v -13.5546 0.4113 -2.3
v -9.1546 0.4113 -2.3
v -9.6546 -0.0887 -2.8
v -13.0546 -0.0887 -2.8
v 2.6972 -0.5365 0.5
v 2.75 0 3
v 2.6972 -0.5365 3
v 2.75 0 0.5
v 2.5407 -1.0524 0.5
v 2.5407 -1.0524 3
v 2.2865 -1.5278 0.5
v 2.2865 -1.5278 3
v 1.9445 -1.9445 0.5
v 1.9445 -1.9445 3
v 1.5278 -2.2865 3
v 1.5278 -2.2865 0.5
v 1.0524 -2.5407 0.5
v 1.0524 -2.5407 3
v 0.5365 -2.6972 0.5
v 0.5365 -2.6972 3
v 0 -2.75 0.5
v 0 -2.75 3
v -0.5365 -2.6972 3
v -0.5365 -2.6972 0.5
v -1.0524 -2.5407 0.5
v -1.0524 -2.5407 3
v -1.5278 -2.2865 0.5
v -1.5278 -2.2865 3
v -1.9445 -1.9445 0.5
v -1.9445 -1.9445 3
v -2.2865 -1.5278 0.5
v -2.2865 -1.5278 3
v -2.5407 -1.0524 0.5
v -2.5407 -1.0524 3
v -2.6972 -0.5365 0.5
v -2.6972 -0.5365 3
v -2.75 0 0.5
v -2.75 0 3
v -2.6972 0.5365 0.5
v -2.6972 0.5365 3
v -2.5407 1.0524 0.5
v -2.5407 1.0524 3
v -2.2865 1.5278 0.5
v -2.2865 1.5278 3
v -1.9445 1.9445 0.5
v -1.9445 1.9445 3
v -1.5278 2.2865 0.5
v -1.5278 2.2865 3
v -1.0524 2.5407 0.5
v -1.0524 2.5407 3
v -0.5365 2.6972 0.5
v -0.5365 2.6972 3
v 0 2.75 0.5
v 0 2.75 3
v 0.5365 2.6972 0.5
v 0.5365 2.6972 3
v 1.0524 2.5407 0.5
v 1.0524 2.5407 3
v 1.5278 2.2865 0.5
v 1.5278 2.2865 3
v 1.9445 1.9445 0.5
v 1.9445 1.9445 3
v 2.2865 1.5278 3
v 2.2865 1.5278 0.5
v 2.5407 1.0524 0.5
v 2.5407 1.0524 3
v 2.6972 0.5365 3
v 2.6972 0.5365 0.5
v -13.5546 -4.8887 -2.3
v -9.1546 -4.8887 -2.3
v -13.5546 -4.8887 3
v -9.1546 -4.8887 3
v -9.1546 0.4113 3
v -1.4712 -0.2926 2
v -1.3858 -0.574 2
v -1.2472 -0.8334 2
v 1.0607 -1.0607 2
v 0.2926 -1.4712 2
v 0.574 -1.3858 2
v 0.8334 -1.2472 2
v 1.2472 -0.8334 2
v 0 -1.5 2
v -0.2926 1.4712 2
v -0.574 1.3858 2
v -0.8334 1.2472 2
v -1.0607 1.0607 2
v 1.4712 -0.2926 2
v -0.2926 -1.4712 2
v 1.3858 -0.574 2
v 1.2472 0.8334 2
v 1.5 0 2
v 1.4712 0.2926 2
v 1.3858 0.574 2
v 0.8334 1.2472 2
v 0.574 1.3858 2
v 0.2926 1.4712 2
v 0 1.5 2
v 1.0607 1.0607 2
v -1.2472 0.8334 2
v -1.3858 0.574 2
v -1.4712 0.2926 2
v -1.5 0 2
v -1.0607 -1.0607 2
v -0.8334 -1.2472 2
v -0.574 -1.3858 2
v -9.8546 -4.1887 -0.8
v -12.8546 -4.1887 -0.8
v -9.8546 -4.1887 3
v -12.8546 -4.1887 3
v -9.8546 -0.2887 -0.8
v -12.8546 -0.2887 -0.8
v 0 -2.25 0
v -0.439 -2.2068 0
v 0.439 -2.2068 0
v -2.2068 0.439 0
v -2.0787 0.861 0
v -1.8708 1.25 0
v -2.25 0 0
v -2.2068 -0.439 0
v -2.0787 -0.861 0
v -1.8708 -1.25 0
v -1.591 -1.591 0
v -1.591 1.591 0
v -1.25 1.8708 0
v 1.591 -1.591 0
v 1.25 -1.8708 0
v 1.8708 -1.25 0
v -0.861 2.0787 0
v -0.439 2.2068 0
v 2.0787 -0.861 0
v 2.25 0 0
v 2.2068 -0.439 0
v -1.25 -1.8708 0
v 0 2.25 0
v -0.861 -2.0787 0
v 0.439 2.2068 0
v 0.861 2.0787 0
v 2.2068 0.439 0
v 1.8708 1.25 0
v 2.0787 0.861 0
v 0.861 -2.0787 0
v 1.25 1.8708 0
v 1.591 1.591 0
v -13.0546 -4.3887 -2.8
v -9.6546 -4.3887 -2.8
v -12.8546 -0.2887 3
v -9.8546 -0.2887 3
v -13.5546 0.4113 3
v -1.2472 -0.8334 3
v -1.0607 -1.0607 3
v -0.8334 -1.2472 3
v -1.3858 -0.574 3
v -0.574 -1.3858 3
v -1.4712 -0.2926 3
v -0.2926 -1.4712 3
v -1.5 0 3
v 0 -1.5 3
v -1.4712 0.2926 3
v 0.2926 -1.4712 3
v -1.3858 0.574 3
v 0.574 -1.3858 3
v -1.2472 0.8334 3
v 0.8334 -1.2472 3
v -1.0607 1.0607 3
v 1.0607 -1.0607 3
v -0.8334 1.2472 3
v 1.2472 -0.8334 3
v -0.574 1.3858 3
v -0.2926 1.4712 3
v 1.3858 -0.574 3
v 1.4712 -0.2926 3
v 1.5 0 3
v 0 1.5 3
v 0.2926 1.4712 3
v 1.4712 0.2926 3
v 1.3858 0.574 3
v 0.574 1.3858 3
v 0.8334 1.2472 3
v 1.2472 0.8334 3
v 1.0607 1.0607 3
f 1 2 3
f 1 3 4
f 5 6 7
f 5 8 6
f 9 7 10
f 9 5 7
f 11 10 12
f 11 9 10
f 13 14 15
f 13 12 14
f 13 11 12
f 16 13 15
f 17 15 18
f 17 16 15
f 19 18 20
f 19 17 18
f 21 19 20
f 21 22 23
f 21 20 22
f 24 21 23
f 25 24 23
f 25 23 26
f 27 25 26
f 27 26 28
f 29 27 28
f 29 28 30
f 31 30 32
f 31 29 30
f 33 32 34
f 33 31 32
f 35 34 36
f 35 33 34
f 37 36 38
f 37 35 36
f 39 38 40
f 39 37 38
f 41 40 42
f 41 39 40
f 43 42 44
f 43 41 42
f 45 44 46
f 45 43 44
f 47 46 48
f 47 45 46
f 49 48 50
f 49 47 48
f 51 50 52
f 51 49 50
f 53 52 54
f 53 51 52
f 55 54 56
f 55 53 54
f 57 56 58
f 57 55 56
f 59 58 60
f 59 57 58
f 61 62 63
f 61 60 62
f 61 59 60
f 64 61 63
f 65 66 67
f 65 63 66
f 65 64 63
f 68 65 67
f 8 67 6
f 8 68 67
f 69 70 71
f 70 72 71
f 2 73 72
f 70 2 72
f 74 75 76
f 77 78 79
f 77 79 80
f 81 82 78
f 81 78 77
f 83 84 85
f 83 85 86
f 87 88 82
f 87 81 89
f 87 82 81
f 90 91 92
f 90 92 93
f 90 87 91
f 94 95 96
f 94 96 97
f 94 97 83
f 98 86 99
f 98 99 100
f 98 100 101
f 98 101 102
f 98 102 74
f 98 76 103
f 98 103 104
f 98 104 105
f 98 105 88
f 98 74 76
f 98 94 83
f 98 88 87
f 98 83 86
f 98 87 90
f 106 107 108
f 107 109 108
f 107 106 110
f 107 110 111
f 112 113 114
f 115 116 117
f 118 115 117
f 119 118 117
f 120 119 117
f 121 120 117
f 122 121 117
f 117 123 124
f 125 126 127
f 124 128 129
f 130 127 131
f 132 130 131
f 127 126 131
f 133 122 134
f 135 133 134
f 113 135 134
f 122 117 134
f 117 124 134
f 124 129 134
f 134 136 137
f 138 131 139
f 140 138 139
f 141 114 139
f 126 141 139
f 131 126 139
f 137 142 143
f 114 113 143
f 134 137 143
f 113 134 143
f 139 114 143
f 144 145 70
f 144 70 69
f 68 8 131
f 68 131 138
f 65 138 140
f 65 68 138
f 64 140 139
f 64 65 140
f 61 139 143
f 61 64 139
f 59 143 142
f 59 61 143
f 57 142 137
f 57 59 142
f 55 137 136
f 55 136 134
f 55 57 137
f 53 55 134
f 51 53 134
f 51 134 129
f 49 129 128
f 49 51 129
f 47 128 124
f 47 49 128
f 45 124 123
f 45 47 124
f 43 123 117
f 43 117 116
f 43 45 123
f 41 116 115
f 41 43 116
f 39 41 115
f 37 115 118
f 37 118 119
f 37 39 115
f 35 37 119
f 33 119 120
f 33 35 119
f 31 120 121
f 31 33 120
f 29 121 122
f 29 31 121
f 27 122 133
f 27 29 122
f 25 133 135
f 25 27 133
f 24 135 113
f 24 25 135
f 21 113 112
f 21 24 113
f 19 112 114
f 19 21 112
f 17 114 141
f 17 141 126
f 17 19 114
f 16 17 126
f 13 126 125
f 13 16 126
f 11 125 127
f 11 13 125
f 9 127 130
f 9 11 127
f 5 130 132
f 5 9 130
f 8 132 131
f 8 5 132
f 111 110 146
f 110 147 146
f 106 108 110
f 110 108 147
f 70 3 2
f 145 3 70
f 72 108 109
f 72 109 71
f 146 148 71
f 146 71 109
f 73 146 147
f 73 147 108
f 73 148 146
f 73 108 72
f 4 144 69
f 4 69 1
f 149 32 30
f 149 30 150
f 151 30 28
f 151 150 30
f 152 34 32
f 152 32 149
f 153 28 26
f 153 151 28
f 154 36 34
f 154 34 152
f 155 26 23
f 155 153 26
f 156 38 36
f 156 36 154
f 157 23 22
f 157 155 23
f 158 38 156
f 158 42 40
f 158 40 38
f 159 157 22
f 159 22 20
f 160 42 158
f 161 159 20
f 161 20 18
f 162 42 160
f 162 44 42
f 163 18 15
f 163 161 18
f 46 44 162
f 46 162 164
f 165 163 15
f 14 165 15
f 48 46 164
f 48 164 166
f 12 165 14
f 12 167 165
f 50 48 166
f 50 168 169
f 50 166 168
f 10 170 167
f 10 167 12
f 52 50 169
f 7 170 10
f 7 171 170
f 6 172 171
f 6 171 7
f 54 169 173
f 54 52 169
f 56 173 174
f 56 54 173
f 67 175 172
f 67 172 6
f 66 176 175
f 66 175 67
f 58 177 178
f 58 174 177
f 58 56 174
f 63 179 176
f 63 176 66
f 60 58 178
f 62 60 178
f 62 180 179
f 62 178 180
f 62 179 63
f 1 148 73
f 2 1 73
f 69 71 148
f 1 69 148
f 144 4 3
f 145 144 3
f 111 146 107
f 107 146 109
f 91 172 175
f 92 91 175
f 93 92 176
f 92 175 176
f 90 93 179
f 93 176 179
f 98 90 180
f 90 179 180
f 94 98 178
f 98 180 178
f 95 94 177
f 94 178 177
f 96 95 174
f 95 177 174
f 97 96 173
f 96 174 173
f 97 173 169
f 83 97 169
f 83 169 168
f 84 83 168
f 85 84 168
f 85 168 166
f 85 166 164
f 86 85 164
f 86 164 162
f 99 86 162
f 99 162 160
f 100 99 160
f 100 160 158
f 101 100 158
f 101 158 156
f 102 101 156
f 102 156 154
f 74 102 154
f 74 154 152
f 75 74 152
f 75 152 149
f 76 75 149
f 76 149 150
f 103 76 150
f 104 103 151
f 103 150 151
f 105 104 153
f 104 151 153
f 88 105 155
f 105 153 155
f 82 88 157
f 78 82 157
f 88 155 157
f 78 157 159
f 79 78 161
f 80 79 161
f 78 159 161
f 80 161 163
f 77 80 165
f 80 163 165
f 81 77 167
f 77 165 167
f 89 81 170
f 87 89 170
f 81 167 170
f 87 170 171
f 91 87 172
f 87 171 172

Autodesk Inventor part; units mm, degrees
ref_plane "YZ Plane" through (0, 0, 0) normal (1, 0, 0) x (0, 1, 0)
ref_plane "XZ Plane" through (0, 0, 0) normal (0, 1, 0) x (-1, 0, 0)
ref_plane "XY Plane" through (0, 0, 0) normal (0, 0, 1) x (1, 0, 0)
sketch "Sketch1" plane through (0, 0, 0) normal (0, 0, 1) x (1, 0, 0)
  circle A0 centre (0, 0) radius 2.75
  dimension "d0" = 5.5
extrude "Extrusion1" add sketch "Sketch1" along normal blind 3
sketch "Sketch2" plane through (0, 0, 3) normal (0, 0, 1) x (1, 0, 0)
  circle A0 centre (0, 0) radius 1.5
  dimension "d3" = 3
extrude "Extrusion2" cut sketch "Sketch2" against normal blind 1
chamfer "Chamfer1" distance 0.5 angle 45 1 edges at (-2.75, 0, 0)
sketch "Sketch3" plane through (0, 0, 3) normal (0, 0, 1) x (1, 0, 0)
  line L0 (-9.8546, -0.2887) -> (-12.8546, -0.2887)
  line L1 (-12.8546, -0.2887) -> (-12.8546, -4.1887)
  line L2 (-12.8546, -4.1887) -> (-9.8546, -4.1887)
  line L3 (-9.8546, -4.1887) -> (-9.8546, -0.2887)
  line L4 (-9.1546, -4.8887) -> (-13.5546, -4.8887)
  line L5 (-13.5546, -4.8887) -> (-13.5546, 0.4113)
  line L6 (-13.5546, 0.4113) -> (-9.1546, 0.4113)
  line L7 (-9.1546, 0.4113) -> (-9.1546, -4.8887)
  point P0 (0, 0)
  dimension "d9" = 3
  dimension "d10" = 3.9
  dimension "d11" = 0.7
extrude "Extrusion3" add sketch "Sketch3" against normal blind 5.8
sketch "Sketch4" plane through (0, 0, -2.8) normal (0, 0, -1) x (-1, 0, 0)
  line L0 (9.8546, -4.1887) -> (9.8546, -0.2887) projected
  line L1 (12.8546, -0.2887) -> (12.8546, -4.1887) projected
  line L2 (12.8546, -4.1887) -> (9.8546, -4.1887) projected
  line L3 (9.8546, -4.1887) -> (9.8546, -0.2887) projected
  line L4 (9.8546, -0.2887) -> (12.8546, -0.2887) projected
  line L5 (9.1546, -4.8887) -> (13.5546, -4.8887) projected
  line L6 (13.5546, -4.8887) -> (13.5546, 0.4113) projected
  line L7 (13.5546, 0.4113) -> (9.1546, 0.4113) projected
  line L8 (9.1546, 0.4113) -> (9.1546, -4.8887) projected
  point P0 (0, 0)
extrude "Extrusion4" add sketch "Sketch4" against normal blind 2 contours L0 L4 L1 L2
chamfer "Chamfer2" distance 0.5 angle 45 4 edges at (-11.3546, -4.8887, -2.8) (-13.5546, -2.2387, -2.8) (-11.3546, 0.4113, -2.8) (-9.1546, -2.2387, -2.8)
properties part number "Calculator buttons"
